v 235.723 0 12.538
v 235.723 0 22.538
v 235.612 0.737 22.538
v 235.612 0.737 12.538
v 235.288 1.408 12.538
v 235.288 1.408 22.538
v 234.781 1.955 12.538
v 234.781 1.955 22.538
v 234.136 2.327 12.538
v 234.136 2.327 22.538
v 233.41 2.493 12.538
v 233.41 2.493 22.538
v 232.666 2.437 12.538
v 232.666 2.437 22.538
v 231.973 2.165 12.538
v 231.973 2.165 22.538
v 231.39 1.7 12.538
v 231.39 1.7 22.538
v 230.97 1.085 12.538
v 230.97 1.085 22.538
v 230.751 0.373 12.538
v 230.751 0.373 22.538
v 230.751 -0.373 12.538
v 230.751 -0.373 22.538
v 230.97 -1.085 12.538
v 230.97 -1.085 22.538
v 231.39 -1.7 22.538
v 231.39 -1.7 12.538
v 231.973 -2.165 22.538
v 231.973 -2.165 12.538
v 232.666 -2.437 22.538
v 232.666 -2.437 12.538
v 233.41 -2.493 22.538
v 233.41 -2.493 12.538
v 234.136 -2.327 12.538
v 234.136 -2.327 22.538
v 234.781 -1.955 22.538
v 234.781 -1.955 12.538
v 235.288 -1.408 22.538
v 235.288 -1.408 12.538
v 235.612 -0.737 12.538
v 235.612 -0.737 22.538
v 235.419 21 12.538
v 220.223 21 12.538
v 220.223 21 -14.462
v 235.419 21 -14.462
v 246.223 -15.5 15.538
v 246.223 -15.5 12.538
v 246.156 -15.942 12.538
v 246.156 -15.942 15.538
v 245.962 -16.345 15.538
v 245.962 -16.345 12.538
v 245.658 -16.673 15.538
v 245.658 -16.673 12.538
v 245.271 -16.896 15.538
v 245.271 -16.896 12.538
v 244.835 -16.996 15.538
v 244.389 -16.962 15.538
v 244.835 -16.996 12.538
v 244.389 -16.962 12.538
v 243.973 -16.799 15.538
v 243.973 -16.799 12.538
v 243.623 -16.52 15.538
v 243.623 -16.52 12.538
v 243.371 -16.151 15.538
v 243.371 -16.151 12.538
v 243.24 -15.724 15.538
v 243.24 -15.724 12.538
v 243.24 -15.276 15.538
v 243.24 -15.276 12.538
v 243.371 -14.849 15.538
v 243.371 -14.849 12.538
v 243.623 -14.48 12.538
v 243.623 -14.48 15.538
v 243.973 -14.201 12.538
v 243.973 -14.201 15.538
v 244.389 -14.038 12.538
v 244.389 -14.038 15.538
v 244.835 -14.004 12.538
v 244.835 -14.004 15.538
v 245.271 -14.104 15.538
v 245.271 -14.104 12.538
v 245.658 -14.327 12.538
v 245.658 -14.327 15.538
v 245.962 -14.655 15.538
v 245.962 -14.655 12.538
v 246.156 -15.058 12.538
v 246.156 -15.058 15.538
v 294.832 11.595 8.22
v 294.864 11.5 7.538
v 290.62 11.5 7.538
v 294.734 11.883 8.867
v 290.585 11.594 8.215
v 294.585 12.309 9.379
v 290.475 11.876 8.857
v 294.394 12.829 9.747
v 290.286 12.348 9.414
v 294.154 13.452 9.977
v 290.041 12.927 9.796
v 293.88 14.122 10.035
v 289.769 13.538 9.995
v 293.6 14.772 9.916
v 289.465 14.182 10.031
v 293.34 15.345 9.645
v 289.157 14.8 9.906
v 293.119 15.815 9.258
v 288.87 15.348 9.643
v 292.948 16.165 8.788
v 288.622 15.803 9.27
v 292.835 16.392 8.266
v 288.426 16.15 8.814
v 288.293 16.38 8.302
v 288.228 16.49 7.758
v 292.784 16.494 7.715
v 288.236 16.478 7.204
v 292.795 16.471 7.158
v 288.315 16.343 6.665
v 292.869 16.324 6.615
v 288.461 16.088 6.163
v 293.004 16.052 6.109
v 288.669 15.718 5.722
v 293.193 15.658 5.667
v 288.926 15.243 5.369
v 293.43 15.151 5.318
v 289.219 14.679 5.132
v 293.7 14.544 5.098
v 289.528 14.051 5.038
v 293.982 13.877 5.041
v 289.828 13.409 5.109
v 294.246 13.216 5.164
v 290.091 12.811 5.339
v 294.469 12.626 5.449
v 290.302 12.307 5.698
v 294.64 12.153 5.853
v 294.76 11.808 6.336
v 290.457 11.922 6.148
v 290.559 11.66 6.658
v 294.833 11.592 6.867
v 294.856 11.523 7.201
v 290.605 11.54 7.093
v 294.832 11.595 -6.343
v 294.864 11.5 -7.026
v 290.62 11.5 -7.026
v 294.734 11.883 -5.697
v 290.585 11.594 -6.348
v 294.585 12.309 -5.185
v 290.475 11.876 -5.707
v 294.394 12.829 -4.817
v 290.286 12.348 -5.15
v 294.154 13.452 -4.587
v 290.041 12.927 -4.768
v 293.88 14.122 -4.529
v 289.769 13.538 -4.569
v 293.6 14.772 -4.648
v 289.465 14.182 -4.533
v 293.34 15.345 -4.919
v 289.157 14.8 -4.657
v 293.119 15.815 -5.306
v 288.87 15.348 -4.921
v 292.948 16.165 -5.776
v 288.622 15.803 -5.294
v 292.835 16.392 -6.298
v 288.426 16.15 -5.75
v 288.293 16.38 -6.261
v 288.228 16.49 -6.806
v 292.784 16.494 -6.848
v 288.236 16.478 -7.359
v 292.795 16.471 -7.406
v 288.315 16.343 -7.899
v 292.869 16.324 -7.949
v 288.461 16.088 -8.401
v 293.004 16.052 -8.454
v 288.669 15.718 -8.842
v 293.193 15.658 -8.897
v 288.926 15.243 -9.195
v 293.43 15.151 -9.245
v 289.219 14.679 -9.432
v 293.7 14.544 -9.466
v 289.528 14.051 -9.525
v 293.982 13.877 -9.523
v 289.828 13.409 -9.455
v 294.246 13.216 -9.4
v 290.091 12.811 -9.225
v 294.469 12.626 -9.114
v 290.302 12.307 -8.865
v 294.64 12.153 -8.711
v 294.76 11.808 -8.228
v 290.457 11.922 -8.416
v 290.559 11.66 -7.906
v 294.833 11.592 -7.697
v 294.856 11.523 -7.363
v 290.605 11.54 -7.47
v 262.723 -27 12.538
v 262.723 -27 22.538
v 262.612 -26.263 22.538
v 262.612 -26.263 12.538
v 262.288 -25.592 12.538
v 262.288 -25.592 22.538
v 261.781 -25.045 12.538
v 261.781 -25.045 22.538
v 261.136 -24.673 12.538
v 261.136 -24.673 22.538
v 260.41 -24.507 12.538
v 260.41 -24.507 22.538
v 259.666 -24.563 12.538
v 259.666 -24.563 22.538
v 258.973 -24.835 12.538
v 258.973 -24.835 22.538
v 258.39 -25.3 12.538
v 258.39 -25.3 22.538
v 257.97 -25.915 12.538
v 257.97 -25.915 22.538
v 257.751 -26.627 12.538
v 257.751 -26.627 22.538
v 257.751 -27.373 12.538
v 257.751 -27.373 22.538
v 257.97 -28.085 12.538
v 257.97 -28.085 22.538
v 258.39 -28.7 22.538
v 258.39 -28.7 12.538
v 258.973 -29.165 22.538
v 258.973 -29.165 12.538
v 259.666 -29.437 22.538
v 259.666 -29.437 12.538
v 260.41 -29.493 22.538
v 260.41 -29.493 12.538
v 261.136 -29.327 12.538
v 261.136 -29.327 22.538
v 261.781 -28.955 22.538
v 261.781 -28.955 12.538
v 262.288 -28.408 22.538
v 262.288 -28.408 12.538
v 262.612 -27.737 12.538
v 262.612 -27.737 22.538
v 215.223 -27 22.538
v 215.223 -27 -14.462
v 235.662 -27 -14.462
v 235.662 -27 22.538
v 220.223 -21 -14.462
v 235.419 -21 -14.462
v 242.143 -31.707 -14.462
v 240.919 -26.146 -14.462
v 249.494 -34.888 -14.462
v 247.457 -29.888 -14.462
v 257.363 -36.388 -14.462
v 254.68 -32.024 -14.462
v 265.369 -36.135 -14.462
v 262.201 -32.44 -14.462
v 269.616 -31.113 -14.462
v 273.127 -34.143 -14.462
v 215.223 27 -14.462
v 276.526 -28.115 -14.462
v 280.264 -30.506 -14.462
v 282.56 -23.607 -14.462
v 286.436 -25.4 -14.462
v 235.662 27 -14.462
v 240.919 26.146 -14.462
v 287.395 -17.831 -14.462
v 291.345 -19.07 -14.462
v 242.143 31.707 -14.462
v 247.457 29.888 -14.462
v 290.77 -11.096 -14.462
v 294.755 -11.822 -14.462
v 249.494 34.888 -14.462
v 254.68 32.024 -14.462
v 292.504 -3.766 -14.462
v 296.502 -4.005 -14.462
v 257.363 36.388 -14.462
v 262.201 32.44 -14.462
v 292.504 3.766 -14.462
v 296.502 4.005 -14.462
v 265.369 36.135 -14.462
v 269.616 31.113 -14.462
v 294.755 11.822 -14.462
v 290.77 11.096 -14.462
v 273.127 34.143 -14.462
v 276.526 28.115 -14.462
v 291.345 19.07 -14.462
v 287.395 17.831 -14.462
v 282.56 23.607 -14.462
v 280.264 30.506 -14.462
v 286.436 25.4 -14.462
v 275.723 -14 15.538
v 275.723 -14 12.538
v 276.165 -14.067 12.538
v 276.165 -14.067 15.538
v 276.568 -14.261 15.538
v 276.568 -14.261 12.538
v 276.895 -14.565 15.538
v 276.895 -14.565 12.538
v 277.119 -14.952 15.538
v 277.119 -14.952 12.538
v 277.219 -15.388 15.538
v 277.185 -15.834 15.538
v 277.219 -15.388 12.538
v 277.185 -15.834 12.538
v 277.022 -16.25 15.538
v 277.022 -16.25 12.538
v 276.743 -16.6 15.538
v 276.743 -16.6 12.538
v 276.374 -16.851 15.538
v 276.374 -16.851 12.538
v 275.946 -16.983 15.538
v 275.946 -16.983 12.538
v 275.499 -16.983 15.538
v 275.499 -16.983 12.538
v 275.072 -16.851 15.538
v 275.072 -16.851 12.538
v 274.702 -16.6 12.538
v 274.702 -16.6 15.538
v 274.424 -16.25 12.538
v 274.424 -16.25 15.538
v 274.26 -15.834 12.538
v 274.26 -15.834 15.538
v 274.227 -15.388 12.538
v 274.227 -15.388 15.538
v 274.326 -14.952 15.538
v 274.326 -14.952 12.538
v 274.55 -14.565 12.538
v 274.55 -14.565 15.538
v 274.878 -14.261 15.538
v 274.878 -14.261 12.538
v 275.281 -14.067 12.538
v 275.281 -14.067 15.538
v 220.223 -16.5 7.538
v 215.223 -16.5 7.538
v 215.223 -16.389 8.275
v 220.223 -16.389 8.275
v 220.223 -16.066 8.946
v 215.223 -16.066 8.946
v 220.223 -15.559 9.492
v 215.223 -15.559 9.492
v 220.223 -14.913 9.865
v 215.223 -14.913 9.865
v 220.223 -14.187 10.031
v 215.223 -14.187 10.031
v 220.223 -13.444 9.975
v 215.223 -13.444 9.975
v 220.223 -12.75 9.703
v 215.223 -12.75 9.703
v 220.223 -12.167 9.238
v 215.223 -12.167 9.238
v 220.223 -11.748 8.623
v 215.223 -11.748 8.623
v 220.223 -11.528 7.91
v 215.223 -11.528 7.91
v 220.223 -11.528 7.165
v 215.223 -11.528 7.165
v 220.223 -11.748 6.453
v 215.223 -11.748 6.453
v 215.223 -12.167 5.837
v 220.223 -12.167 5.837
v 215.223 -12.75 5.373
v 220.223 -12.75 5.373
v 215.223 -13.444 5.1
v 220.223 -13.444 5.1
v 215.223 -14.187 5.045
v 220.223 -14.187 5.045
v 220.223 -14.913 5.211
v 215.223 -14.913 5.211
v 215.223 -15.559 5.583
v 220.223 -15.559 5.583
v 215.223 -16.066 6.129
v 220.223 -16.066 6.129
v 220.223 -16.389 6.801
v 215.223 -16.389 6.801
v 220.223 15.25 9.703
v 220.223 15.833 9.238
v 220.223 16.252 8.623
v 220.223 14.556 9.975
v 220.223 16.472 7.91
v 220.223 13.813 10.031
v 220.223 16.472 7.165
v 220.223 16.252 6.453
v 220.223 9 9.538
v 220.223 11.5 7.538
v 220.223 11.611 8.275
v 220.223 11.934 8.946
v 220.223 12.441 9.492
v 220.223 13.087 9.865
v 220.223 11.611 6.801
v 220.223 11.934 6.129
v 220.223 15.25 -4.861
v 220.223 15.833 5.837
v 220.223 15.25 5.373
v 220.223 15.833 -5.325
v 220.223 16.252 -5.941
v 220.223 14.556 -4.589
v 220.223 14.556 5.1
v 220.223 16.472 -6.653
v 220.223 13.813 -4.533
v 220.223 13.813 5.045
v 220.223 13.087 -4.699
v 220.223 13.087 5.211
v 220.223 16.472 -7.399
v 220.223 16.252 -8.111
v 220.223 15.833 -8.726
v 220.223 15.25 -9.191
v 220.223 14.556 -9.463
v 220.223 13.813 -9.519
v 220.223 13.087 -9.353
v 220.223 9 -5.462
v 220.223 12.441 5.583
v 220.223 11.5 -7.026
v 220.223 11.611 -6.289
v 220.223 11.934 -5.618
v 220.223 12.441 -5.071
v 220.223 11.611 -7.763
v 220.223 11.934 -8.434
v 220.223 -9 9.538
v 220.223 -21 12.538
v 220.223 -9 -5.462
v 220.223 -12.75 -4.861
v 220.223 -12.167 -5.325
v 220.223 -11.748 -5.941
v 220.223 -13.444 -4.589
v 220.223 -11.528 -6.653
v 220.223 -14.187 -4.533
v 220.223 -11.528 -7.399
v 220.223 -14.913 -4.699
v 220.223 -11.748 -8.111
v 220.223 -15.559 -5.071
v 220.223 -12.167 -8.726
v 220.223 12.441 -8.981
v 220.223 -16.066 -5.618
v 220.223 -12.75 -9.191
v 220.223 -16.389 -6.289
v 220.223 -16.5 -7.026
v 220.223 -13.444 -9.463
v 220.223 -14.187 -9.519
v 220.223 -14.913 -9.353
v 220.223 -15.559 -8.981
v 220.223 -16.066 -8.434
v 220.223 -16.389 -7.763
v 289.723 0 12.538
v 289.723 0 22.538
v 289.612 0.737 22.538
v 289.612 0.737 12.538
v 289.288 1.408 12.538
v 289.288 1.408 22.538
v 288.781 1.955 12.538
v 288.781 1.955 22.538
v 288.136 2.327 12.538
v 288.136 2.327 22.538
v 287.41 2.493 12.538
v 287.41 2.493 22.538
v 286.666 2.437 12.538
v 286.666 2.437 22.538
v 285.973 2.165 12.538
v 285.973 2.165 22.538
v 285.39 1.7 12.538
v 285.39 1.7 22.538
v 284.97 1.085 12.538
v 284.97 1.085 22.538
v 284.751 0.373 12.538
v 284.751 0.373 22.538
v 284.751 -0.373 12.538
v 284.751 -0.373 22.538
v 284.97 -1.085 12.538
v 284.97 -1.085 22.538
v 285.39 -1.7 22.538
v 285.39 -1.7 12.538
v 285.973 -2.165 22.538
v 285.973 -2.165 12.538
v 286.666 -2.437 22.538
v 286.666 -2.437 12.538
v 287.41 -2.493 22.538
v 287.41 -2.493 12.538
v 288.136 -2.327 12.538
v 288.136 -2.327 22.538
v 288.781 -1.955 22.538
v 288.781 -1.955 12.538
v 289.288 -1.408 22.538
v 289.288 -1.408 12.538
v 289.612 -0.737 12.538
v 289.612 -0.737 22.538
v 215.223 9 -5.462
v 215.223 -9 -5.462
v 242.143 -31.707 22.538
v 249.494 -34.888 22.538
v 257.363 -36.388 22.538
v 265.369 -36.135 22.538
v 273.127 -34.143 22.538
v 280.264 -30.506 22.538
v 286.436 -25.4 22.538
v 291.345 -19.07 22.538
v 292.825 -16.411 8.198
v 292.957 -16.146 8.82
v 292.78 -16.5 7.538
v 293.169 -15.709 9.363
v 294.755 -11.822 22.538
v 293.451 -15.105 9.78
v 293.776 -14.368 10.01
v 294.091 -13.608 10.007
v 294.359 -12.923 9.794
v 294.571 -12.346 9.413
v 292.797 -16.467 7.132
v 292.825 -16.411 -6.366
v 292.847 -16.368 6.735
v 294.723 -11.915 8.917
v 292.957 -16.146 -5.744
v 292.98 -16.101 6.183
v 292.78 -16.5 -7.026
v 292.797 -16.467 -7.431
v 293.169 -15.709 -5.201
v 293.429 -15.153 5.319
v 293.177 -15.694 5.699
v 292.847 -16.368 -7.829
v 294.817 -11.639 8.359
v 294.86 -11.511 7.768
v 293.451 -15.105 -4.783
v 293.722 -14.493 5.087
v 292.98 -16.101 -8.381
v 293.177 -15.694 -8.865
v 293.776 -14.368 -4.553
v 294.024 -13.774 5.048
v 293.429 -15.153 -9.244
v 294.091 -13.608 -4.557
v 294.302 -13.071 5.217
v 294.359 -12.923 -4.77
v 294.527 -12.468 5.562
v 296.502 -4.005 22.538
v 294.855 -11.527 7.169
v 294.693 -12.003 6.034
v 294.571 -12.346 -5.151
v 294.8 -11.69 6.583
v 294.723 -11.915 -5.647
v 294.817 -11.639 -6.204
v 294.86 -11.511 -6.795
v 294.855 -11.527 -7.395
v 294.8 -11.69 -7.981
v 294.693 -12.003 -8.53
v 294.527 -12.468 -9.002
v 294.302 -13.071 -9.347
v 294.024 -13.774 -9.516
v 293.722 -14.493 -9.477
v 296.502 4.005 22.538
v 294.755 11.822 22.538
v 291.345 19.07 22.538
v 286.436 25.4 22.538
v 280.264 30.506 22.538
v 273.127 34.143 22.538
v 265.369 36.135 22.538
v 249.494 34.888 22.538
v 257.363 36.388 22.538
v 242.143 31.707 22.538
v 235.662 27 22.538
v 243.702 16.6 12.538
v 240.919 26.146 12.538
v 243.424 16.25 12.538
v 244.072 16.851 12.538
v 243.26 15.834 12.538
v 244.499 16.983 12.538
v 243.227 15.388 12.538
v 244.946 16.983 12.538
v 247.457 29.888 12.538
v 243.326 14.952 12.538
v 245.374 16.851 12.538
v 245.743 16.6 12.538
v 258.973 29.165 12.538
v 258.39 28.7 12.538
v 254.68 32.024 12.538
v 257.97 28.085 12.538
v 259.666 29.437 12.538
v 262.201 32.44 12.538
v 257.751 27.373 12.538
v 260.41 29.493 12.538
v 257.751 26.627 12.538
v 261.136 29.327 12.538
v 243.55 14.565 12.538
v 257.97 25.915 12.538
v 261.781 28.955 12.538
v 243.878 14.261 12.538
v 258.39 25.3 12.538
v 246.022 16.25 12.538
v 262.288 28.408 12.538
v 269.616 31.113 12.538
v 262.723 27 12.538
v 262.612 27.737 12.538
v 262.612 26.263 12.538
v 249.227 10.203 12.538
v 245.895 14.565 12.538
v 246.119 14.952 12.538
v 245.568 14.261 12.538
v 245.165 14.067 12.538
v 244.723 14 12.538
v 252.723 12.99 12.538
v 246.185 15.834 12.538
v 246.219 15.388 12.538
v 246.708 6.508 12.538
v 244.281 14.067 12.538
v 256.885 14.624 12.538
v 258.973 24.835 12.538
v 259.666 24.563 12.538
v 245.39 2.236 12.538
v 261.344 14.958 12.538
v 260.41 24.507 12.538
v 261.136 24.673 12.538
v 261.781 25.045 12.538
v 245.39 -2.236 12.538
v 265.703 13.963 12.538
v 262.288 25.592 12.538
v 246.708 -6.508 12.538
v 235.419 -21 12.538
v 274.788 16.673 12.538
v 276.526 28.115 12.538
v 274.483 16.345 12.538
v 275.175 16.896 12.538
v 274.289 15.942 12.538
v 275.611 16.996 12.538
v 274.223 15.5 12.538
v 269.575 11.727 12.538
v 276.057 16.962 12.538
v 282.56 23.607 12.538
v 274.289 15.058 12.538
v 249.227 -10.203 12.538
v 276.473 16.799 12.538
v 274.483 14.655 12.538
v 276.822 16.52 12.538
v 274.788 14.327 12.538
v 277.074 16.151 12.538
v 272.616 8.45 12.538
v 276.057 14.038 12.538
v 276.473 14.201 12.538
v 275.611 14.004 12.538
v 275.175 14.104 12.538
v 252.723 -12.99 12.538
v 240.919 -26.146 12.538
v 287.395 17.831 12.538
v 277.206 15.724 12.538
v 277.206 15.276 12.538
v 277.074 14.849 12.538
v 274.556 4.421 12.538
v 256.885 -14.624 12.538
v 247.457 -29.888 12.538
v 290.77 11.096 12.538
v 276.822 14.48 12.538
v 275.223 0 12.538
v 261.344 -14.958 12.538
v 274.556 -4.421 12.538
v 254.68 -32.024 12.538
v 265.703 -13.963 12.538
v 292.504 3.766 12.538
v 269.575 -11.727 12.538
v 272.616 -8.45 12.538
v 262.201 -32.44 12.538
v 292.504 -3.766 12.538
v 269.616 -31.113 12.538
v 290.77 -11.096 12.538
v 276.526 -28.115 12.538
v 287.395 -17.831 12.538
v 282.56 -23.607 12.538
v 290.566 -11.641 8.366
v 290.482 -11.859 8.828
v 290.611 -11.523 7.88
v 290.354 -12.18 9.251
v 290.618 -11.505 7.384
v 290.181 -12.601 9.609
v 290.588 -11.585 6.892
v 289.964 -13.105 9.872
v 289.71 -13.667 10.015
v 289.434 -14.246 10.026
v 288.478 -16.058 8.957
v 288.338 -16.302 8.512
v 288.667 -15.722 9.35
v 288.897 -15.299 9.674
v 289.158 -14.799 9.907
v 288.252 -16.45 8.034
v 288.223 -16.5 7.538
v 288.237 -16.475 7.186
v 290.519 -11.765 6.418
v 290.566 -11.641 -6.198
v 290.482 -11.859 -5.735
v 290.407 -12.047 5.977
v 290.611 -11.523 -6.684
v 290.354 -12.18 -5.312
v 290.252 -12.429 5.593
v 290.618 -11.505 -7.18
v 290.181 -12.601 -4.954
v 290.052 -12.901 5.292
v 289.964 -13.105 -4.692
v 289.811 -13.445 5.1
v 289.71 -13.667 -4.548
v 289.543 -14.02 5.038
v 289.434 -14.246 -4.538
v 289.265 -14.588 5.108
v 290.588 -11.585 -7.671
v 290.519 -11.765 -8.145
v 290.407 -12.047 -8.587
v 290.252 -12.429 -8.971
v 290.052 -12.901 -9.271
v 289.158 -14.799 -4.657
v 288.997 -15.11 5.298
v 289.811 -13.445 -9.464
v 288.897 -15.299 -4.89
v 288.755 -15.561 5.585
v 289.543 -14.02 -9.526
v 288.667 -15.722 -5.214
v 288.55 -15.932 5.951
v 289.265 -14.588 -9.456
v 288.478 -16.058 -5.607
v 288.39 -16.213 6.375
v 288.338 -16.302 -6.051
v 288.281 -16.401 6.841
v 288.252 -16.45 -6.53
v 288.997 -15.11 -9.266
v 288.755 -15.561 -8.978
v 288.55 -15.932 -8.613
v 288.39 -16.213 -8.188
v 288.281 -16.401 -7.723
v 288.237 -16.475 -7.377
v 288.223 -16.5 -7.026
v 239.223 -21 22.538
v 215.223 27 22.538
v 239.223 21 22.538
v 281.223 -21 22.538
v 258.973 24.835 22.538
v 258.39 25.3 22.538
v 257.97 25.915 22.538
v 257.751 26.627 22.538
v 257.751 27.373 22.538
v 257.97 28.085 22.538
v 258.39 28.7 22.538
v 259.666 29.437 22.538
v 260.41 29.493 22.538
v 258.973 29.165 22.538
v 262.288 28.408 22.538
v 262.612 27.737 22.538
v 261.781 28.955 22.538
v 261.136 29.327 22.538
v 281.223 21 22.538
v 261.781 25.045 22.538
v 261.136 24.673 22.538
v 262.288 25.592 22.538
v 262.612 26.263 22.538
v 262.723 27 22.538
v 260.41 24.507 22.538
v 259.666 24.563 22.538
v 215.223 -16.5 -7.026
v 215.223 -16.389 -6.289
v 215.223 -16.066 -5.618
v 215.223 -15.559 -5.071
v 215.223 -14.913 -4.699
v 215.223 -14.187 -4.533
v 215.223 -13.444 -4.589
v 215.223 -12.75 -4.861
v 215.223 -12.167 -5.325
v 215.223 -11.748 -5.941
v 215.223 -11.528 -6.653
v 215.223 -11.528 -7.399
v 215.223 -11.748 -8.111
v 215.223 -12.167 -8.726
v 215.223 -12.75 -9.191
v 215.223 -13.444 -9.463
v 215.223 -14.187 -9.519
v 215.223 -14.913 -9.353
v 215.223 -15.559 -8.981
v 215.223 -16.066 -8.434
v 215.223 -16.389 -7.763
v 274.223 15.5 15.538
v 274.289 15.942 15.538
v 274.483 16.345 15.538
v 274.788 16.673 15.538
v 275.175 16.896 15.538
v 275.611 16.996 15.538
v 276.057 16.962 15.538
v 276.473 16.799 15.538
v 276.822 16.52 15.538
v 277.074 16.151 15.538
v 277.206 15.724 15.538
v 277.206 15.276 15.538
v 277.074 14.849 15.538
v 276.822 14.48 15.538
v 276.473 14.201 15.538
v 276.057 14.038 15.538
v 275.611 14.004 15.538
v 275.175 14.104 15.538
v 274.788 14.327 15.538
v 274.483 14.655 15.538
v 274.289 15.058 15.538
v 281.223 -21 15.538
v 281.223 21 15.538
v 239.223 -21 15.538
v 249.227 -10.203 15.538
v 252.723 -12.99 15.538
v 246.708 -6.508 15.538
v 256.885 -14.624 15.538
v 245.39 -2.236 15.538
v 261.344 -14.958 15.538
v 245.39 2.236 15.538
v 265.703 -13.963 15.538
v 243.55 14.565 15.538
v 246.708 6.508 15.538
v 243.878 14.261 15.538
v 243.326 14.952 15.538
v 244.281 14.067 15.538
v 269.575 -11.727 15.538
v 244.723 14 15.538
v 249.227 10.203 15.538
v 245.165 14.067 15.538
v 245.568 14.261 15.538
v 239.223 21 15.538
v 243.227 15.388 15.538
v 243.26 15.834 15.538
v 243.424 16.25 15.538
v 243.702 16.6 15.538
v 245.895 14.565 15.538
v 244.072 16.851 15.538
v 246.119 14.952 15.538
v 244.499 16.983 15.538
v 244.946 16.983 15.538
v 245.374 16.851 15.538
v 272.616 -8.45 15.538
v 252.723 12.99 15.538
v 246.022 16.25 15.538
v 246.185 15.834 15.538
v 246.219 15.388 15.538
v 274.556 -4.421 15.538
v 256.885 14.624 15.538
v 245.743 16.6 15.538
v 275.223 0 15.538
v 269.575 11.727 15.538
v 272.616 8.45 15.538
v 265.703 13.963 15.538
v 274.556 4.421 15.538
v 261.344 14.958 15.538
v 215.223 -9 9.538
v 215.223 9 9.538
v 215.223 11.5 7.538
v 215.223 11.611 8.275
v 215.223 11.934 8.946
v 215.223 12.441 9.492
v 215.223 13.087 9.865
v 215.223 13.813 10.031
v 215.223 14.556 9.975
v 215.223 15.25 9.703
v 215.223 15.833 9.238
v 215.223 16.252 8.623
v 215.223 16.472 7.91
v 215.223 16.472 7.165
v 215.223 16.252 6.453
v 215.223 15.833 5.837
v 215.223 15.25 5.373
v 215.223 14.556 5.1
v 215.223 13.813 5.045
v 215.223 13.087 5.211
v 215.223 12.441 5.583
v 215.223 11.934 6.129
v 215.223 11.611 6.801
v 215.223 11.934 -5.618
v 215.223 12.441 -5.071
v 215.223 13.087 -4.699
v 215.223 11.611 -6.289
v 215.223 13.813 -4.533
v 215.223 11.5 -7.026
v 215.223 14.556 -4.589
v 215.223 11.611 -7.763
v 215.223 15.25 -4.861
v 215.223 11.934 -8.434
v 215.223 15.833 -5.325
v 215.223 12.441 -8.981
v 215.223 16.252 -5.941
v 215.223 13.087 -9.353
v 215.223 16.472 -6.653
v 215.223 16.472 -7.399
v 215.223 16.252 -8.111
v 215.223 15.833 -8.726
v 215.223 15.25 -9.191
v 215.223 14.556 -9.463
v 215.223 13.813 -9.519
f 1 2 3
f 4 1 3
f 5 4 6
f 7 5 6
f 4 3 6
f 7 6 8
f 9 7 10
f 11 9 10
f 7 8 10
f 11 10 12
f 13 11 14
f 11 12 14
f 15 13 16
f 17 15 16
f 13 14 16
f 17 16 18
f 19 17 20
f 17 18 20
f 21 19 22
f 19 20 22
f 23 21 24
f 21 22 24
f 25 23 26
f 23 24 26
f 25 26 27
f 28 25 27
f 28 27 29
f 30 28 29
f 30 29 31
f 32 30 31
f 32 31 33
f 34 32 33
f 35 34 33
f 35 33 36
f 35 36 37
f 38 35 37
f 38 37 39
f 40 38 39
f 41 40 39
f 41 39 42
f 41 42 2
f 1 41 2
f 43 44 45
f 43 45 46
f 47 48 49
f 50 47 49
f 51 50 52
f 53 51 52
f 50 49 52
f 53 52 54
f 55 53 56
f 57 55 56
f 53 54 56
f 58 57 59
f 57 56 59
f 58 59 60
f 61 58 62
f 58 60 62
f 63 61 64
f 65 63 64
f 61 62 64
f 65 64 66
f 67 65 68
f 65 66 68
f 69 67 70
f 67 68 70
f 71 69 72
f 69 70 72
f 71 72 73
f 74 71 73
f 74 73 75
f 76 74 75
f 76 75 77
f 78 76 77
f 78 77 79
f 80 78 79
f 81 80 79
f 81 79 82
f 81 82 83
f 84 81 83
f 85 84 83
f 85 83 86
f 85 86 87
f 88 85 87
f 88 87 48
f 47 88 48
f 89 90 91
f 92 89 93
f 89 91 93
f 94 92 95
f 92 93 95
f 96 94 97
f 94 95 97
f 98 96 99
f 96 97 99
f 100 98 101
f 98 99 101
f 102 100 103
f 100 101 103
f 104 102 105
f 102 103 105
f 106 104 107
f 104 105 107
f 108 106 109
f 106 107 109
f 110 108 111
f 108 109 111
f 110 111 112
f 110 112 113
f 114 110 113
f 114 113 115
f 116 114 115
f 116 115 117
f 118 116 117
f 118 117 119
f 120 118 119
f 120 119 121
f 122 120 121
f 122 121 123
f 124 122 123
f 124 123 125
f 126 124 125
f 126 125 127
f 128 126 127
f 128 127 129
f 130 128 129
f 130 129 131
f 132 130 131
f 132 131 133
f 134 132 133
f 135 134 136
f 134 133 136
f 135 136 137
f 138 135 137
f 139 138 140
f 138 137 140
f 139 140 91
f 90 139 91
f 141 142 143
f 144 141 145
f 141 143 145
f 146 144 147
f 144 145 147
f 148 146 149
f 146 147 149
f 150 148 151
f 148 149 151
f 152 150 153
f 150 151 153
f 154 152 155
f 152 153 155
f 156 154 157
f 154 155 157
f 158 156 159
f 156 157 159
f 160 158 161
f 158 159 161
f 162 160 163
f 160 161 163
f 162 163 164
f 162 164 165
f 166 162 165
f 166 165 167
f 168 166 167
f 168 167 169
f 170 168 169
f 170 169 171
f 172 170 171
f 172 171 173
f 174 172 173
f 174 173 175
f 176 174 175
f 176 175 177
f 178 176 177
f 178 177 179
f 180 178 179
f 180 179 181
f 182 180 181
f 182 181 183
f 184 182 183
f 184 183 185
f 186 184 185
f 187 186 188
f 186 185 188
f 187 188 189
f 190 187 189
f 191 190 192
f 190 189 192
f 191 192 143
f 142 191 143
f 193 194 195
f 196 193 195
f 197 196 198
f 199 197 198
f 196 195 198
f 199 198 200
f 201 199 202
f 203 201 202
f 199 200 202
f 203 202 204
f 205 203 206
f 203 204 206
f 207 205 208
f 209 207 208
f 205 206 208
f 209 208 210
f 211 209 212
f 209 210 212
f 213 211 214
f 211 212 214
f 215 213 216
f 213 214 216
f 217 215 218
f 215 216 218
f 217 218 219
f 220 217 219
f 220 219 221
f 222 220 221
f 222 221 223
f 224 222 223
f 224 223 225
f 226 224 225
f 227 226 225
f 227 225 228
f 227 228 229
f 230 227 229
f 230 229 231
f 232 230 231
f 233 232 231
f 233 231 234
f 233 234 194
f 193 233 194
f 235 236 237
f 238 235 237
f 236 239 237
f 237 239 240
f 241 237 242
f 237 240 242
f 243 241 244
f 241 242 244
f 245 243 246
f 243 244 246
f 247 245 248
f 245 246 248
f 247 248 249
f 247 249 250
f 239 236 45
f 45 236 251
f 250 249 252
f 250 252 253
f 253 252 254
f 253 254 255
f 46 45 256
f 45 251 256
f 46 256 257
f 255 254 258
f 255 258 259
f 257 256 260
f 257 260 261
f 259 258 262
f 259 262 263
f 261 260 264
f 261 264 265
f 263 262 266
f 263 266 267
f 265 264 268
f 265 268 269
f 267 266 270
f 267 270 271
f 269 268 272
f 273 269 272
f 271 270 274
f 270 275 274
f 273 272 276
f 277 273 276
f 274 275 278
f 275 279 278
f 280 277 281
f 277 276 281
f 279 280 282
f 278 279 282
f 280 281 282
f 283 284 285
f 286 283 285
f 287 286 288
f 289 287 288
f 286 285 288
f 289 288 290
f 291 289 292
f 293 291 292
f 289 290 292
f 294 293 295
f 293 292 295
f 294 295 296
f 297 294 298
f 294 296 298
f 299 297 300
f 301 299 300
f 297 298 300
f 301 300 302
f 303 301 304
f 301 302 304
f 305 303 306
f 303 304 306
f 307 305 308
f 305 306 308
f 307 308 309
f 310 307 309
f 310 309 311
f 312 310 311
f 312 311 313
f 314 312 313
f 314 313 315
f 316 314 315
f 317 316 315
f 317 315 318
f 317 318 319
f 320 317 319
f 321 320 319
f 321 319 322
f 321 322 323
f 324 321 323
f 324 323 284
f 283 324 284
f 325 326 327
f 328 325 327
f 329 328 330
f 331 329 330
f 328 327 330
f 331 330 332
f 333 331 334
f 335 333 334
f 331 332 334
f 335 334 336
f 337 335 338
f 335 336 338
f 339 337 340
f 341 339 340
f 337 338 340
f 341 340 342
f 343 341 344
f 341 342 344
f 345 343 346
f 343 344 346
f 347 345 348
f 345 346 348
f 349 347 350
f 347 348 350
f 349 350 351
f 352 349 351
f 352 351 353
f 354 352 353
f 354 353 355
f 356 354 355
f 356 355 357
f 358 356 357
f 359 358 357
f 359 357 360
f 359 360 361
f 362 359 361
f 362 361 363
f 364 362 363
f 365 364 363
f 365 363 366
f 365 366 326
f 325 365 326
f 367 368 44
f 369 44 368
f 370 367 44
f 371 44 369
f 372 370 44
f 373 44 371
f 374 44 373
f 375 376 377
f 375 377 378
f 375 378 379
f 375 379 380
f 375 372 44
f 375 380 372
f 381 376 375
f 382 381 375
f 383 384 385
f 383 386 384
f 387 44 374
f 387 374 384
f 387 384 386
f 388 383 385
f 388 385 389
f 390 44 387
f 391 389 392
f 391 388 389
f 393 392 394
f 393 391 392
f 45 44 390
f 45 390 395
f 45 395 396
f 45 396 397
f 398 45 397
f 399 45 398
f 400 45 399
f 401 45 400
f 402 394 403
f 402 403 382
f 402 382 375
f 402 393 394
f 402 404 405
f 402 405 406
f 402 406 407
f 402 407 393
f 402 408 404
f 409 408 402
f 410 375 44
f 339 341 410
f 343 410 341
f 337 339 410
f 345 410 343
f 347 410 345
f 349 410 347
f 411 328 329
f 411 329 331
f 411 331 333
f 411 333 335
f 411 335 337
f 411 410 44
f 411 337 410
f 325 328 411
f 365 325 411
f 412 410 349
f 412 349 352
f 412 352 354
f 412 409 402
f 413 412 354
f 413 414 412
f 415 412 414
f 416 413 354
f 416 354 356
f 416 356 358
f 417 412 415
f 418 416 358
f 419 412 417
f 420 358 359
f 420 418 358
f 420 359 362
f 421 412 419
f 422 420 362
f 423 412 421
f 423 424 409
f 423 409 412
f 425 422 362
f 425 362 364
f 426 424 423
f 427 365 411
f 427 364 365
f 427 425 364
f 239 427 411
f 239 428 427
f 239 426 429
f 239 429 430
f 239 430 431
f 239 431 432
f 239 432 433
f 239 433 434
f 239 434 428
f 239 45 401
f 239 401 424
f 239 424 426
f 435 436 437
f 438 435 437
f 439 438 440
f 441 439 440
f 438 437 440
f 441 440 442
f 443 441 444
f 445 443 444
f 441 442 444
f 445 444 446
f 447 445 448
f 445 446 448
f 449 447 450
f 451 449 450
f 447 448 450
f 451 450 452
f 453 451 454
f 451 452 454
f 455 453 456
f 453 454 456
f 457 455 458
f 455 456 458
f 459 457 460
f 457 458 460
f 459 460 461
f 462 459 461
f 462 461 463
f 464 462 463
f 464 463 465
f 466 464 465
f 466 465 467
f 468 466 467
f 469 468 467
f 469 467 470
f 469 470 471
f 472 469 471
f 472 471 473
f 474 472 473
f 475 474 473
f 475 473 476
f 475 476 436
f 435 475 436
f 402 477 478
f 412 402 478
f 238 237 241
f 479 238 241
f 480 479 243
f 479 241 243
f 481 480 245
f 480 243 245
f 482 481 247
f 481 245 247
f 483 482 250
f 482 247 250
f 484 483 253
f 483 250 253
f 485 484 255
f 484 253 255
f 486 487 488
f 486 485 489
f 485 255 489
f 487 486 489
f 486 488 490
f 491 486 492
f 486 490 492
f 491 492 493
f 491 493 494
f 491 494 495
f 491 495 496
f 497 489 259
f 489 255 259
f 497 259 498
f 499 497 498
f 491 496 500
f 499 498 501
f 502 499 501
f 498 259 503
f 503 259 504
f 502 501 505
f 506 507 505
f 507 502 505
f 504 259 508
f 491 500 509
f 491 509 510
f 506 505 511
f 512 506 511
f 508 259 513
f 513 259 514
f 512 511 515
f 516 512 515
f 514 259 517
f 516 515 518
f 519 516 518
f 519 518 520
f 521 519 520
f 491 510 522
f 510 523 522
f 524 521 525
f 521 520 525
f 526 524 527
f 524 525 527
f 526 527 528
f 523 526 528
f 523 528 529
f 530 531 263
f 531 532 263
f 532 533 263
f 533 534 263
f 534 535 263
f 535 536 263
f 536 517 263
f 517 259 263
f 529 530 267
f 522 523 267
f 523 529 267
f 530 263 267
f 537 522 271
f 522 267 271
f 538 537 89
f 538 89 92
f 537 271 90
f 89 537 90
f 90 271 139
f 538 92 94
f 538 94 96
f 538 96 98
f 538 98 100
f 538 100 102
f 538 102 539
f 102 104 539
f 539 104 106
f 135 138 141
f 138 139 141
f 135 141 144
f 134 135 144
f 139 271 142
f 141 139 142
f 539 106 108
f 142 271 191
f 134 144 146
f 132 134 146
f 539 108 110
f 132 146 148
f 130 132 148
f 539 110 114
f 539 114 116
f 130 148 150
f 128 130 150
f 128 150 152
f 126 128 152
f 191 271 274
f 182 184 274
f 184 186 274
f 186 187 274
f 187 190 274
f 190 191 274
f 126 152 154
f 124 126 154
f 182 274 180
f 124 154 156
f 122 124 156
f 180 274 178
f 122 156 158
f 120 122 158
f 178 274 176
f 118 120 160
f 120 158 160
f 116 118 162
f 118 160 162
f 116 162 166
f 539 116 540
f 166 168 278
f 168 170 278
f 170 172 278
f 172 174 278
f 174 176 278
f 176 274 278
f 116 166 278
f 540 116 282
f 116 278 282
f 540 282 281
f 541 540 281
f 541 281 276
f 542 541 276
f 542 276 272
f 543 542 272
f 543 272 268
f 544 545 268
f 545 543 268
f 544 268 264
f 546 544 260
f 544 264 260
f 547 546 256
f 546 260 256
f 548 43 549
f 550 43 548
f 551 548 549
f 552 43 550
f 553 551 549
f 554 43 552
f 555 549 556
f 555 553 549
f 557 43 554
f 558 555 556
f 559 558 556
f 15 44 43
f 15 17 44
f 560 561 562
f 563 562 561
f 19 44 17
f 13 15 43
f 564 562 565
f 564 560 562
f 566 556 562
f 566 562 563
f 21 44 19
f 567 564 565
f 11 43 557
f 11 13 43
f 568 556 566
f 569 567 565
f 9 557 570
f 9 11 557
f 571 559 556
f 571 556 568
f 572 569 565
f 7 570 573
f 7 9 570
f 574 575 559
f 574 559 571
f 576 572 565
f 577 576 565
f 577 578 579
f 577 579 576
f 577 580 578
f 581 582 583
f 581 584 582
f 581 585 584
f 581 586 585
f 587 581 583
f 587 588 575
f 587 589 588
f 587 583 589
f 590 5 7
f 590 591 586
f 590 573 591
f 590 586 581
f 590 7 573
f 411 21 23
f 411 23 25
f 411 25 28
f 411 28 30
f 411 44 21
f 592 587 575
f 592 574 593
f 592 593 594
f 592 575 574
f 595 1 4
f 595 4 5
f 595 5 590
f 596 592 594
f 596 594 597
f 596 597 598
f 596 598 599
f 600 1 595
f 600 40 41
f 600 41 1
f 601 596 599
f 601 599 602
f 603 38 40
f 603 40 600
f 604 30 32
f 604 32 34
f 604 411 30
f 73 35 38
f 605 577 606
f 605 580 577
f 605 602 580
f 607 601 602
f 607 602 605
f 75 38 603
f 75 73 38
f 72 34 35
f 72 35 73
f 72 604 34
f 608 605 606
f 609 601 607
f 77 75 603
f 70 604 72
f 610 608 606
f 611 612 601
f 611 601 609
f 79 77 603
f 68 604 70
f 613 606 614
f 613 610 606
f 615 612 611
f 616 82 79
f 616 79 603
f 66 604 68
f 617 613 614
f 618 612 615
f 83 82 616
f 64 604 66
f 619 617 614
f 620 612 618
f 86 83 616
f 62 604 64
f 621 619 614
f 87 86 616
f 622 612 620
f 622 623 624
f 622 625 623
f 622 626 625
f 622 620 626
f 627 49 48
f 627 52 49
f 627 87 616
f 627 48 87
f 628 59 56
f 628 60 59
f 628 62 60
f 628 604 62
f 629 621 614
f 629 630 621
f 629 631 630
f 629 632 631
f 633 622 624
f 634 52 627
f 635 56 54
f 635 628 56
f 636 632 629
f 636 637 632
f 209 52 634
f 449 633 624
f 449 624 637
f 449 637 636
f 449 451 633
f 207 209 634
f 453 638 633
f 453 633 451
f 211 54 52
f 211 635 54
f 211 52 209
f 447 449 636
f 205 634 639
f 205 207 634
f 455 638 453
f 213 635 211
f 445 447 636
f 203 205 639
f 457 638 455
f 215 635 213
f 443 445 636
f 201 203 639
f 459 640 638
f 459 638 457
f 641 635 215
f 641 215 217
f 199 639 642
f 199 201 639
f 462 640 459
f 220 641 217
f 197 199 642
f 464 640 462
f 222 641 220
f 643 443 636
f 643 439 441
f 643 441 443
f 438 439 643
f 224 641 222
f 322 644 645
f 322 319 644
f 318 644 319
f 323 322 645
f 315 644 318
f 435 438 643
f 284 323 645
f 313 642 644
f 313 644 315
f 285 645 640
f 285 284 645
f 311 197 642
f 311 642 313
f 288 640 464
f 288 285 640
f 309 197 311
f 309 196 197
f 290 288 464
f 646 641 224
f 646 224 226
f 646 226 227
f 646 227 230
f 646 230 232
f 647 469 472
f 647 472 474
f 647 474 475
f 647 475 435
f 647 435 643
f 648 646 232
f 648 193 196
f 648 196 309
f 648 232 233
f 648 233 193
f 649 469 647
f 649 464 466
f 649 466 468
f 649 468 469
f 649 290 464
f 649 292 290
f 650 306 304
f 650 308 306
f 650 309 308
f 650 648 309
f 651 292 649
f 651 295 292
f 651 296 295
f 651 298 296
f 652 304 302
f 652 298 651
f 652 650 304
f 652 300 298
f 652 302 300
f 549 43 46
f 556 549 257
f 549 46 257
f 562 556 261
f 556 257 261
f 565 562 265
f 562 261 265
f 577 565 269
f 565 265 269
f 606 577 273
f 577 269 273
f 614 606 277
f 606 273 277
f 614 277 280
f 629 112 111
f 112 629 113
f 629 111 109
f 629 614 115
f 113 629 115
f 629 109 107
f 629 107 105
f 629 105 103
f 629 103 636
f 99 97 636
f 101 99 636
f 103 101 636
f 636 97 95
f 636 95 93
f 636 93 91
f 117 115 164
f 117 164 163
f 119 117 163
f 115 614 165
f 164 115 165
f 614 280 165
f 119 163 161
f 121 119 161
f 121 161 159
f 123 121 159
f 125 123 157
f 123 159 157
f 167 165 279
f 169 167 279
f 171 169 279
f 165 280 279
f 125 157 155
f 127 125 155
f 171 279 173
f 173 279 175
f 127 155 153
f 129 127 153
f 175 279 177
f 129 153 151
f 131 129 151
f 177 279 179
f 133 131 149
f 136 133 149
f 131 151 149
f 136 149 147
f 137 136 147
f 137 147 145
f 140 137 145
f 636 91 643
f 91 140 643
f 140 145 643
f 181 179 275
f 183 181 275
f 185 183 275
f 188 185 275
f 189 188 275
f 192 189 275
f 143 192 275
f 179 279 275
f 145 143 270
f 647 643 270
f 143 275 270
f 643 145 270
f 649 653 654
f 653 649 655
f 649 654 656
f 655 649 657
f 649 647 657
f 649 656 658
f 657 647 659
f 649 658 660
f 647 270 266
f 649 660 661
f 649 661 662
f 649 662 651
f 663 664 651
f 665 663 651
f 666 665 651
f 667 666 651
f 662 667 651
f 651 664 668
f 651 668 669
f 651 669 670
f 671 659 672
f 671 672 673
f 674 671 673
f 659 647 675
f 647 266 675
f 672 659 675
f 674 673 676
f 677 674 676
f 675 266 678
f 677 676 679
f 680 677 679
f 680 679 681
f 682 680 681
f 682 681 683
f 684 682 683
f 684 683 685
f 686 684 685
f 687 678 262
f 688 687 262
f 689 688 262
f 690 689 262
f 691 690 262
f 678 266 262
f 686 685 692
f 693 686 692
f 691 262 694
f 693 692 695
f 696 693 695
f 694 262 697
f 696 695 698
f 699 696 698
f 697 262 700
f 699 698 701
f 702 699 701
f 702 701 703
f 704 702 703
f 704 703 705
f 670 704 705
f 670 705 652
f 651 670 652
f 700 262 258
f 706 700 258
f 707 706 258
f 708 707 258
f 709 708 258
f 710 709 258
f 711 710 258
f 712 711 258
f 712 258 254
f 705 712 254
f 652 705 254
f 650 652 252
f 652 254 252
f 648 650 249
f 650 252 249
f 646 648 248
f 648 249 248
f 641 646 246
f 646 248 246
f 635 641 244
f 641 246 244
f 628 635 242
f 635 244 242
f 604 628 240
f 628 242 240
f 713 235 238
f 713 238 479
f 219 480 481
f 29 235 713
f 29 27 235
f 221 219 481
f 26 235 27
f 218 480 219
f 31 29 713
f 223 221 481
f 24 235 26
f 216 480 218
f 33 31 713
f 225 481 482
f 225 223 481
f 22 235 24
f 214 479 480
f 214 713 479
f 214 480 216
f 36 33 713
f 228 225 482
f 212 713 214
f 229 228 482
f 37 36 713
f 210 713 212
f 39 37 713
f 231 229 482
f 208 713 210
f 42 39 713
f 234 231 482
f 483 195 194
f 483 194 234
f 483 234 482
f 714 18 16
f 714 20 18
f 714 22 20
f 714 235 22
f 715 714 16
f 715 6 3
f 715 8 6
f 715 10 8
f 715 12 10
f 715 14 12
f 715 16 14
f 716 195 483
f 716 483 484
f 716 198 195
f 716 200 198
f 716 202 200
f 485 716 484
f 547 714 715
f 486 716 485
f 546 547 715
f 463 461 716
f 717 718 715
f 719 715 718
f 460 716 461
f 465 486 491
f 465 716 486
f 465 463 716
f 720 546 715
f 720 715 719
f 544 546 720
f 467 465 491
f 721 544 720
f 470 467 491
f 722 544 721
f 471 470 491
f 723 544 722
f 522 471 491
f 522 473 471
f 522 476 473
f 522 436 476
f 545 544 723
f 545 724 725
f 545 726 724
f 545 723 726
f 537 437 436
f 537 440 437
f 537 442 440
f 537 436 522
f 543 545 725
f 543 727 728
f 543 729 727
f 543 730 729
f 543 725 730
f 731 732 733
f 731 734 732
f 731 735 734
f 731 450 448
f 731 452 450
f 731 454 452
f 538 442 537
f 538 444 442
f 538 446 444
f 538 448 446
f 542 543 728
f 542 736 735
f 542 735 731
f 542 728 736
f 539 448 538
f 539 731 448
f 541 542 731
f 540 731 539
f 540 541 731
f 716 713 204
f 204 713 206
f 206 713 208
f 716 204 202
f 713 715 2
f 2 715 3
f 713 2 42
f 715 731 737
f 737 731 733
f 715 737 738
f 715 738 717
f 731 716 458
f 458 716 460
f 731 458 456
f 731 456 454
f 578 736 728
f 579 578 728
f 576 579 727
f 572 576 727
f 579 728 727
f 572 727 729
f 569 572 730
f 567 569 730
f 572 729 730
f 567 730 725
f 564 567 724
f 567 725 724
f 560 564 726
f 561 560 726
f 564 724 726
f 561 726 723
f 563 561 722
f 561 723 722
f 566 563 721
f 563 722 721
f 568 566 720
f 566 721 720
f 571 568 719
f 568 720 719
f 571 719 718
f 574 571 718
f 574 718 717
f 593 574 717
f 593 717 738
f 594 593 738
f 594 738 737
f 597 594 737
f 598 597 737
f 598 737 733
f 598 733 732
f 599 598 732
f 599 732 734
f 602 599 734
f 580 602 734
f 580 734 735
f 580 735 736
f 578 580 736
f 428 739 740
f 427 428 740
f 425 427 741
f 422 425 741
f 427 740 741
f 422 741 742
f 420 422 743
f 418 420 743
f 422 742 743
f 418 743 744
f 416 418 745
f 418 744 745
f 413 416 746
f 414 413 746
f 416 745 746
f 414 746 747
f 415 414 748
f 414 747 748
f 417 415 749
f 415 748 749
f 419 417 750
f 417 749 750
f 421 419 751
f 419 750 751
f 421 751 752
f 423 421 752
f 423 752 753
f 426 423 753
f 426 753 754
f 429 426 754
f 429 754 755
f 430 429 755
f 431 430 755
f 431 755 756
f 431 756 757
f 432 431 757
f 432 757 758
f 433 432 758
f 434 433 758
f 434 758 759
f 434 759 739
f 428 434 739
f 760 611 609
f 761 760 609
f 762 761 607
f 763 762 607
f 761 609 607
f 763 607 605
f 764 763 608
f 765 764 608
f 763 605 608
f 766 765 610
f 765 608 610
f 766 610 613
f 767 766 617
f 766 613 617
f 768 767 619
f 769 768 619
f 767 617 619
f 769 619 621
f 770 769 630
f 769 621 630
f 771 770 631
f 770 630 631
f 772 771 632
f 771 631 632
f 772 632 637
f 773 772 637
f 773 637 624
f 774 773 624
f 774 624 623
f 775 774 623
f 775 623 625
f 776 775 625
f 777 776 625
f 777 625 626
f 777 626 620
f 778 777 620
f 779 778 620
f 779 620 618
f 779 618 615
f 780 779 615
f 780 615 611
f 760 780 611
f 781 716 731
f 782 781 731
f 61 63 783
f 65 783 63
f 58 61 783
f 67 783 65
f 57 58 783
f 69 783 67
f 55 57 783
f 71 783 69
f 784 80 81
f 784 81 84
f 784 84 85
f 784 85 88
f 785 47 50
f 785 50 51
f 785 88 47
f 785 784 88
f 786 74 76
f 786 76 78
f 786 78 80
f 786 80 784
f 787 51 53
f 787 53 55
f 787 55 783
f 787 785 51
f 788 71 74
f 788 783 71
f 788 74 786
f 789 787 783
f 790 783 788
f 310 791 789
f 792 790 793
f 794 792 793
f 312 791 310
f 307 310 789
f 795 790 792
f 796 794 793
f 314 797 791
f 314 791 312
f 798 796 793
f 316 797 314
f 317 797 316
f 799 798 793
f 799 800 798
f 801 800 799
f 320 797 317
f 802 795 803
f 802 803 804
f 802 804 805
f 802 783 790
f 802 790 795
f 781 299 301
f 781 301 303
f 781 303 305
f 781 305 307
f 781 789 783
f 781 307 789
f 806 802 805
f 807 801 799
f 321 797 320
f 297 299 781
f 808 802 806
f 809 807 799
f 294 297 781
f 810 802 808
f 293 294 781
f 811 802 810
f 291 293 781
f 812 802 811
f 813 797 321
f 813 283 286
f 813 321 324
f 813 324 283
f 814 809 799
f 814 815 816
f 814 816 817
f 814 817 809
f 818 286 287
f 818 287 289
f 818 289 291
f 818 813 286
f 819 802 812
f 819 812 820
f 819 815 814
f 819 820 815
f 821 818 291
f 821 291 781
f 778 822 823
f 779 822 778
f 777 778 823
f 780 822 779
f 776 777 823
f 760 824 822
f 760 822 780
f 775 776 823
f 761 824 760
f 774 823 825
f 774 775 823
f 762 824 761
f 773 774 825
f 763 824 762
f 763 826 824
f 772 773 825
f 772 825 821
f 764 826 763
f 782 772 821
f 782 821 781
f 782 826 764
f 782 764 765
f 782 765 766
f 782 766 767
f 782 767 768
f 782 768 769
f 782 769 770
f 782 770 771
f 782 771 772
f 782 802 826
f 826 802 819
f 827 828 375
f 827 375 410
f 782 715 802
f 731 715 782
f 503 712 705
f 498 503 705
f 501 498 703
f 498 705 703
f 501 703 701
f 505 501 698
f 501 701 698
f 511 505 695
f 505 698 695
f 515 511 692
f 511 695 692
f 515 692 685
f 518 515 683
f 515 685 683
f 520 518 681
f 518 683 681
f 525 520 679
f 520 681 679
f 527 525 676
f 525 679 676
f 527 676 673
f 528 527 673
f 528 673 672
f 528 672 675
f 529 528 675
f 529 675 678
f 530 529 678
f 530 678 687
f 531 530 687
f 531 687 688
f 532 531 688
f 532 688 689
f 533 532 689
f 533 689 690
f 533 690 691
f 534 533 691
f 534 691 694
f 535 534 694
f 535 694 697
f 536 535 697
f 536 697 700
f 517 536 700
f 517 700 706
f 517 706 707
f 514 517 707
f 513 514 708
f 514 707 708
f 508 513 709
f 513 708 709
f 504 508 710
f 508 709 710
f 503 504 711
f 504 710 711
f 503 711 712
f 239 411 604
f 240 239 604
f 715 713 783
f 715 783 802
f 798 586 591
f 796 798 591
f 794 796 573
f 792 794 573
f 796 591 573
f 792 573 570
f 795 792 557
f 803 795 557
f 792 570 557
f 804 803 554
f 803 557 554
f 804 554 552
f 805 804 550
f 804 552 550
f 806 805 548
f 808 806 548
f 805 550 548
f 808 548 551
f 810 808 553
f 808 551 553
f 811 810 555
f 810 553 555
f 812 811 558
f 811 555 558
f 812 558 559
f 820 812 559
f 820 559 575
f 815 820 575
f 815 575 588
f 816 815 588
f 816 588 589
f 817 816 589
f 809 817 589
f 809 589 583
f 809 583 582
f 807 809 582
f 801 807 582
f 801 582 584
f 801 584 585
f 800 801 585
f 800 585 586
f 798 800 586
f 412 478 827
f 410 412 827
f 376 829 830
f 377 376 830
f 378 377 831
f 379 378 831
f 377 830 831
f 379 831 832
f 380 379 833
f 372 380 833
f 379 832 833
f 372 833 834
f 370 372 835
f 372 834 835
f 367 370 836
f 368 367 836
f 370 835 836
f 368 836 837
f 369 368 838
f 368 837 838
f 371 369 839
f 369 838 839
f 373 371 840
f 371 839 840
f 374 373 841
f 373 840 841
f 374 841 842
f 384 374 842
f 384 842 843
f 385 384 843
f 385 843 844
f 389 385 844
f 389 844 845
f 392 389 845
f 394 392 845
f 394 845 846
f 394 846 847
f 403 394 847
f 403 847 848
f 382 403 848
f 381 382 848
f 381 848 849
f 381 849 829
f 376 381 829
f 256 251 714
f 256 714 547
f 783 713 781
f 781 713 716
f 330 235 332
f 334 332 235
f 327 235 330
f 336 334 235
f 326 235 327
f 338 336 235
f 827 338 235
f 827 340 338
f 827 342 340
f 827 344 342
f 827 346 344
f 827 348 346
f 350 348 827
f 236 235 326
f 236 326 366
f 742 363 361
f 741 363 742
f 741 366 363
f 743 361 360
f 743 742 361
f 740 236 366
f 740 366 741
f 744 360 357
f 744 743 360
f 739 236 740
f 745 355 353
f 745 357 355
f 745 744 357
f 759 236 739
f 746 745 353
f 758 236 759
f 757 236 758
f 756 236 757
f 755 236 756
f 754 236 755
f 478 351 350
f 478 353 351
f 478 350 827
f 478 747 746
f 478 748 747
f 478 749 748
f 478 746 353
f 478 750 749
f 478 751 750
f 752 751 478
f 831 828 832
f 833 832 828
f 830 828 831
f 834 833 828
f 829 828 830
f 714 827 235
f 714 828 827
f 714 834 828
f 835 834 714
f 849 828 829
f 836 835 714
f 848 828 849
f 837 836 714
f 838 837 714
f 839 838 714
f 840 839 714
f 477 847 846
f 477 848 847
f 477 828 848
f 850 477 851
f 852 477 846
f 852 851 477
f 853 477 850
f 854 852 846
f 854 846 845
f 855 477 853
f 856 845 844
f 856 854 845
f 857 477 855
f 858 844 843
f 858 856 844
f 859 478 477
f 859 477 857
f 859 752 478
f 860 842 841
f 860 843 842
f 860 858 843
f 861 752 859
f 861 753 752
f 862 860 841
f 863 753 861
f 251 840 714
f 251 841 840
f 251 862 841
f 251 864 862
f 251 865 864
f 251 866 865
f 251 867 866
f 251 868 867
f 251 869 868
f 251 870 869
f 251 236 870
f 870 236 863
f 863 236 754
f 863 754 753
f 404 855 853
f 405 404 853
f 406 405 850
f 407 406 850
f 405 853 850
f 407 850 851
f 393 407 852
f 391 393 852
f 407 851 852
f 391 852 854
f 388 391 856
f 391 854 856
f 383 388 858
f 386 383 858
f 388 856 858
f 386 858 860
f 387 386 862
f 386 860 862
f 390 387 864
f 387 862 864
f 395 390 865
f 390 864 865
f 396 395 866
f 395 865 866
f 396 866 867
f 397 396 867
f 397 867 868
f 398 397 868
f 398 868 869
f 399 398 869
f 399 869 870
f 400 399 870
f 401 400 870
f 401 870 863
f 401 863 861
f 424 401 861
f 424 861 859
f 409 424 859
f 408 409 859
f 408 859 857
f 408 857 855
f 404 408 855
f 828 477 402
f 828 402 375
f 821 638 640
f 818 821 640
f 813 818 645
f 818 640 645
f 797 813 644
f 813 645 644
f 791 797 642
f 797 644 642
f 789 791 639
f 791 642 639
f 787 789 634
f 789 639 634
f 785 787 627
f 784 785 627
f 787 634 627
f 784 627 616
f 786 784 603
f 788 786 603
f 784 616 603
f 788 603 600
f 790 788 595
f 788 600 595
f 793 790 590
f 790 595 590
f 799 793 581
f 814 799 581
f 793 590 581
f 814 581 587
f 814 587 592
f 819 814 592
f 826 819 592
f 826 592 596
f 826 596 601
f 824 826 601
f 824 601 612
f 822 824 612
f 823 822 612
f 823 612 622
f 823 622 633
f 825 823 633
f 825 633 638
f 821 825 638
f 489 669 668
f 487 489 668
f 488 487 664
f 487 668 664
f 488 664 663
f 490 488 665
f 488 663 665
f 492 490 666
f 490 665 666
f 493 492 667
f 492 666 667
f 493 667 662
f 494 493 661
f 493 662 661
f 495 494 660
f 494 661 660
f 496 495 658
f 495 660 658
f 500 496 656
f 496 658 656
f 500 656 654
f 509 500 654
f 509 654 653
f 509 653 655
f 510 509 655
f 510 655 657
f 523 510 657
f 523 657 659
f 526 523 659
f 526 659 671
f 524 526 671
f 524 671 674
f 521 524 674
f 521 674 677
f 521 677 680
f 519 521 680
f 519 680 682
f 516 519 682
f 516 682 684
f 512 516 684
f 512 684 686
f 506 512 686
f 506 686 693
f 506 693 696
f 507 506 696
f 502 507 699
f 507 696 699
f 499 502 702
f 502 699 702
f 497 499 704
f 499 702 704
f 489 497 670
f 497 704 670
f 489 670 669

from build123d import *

# Parameters (mm, degrees)
SKETCH054_R           = 36.5
PAD024_DEPTH          = 37
SKETCH055_W           = 42
SKETCH055_H           = 42
POCKET015_DEPTH       = 7
SKETCH056_R           = 32.5
POCKET016_DEPTH       = 27
SKETCH057_R           = 15
POCKET017_DEPTH       = 5
SKETCH058_R           = 1.5
POCKET018_DEPTH       = 5
POLARPATTERN004_COUNT = 4
PAD025_DEPTH          = 37
SKETCH060_W           = 42
SKETCH060_H           = 21
POCKET019_DEPTH       = 30
SKETCH061_W           = 18
SKETCH061_H           = 15
POCKET020_DEPTH       = 5
SKETCH062_W           = 25
SKETCH062_H           = 42
POCKET021_DEPTH       = 10
SKETCH064_R           = 2.5
POCKET023_DEPTH       = 81.501
SKETCH065_R           = 2.5
POCKET024_DEPTH       = 37.001


with BuildPart() as part:
    # Sketch054 → Pad024 (new body)
    with BuildSketch(Plane.XY):
        Circle(SKETCH054_R)
    extrude(amount=PAD024_DEPTH)

    # Sketch055 (on Face3 of Pad024) → Pocket015 (cut)
    with BuildSketch(Plane.XY.offset(37)):
        Rectangle(SKETCH055_W, SKETCH055_H)
    extrude(amount=-POCKET015_DEPTH, mode=Mode.SUBTRACT)

    # Sketch056 (on Face2 of Pocket015) → Pocket016 (cut)
    with BuildSketch(Plane(origin=(0, 0, 0), x_dir=(1, 0, 0), z_dir=(0, 0, -1))):
        Circle(SKETCH056_R)
    extrude(amount=-POCKET016_DEPTH, mode=Mode.SUBTRACT)

    # Sketch057 (on Face9 of Pocket016) → Pocket017 (cut)
    with BuildSketch(Plane(origin=(0, 0, 27), x_dir=(1, 0, 0), z_dir=(0, 0, -1))):
        Circle(SKETCH057_R)
    extrude(amount=-POCKET017_DEPTH, mode=Mode.SUBTRACT)

    # Sketch058 (on Face9 of Pocket017) → Pocket018 (cut)
    with BuildSketch(Plane(origin=(0, 0, 27), x_dir=(1, 0, 0), z_dir=(0, 0, -1))):
        with Locations((-15.5, 15.5)):
            Circle(SKETCH058_R)
    pocket018 = extrude(amount=-POCKET018_DEPTH, mode=Mode.SUBTRACT)

    # PolarPattern004: Pocket018 ×4 about axis
    polarpattern004_axis = Axis((0, 0, 27), (0, 0, -1))
    for i in range(1, POLARPATTERN004_COUNT):
        add(pocket018.rotate(polarpattern004_axis, i * 360 / POLARPATTERN004_COUNT), mode=Mode.SUBTRACT)

    # Sketch059 (on Face2 of PolarPattern004) → Pad025 (join)
    with BuildSketch(Plane(origin=(0, 0, 0), x_dir=(1, 0, 0), z_dir=(0, 0, -1))):
        with BuildLine():
            Line((-45, 27), (-45, -27))
            Line((-45, -27), (-24.561148, -27))
            ThreePointArc((-24.561148, 27), (-36.5, 0), (-24.561148, -27))
            Line((-45, 27), (-24.561148, 27))
        make_face()
    extrude(amount=-PAD025_DEPTH)

    # Sketch060 (on Face2 of Pad025) → Pocket019 (cut)
    with BuildSketch(Plane(origin=(-40, 0, 0), x_dir=(0, -1, 0), z_dir=(-1, 0, 0))):
        with Locations((0, 16.5)):
            Rectangle(SKETCH060_W, SKETCH060_H)
    extrude(amount=-POCKET019_DEPTH, mode=Mode.SUBTRACT)

    # Sketch061 (on Face2 of Pocket019) → Pocket020 (cut)
    with BuildSketch(Plane(origin=(-45, 0, 0), x_dir=(0, -1, 0), z_dir=(-1, 0, 0))):
        with Locations((0, 16.5)):
            Rectangle(SKETCH061_W, SKETCH061_H)
    extrude(amount=-POCKET020_DEPTH, mode=Mode.SUBTRACT)

    # Sketch062 (on Face4 of Pocket020) → Pocket021 (cut)
    with BuildSketch(Plane(origin=(0, 0, 0), x_dir=(1, 0, 0), z_dir=(0, 0, -1))):
        with Locations((-27.5, 0)):
            Rectangle(SKETCH062_W, SKETCH062_H)
    extrude(amount=-POCKET021_DEPTH, mode=Mode.SUBTRACT)

    # Sketch064 (on Face2 of Pocket021) → Pocket023 (cut, through all)
    with BuildSketch(Plane(origin=(-45, 0, 0), x_dir=(0, -1, 0), z_dir=(-1, 0, 0))):
        with Locations((-14, 22)):
            Circle(SKETCH064_R)
        with Locations((14, 22)):
            Circle(SKETCH064_R)
        with Locations((14, 7.436279)):
            Circle(SKETCH064_R)
        with Locations((-14, 7.436279)):
            Circle(SKETCH064_R)
    extrude(amount=-POCKET023_DEPTH, mode=Mode.SUBTRACT)

    # Sketch065 (on Face5 of Pocket023) → Pocket024 (cut, through all)
    with BuildSketch(Plane.XY.offset(37)):
        with Locations((27, 0)):
            Circle(SKETCH065_R)
        with Locations((0, 27)):
            Circle(SKETCH065_R)
        with Locations((0, -27)):
            Circle(SKETCH065_R)
        with Locations((-27, 0)):
            Circle(SKETCH065_R)
    extrude(amount=-POCKET024_DEPTH, mode=Mode.SUBTRACT)


with BuildPart() as part_1:
    # Body005 placement: moved
    add(part.part.moved(Location((260.222748, 1.6e-05, -14.462208))))


solid = part_1.part
